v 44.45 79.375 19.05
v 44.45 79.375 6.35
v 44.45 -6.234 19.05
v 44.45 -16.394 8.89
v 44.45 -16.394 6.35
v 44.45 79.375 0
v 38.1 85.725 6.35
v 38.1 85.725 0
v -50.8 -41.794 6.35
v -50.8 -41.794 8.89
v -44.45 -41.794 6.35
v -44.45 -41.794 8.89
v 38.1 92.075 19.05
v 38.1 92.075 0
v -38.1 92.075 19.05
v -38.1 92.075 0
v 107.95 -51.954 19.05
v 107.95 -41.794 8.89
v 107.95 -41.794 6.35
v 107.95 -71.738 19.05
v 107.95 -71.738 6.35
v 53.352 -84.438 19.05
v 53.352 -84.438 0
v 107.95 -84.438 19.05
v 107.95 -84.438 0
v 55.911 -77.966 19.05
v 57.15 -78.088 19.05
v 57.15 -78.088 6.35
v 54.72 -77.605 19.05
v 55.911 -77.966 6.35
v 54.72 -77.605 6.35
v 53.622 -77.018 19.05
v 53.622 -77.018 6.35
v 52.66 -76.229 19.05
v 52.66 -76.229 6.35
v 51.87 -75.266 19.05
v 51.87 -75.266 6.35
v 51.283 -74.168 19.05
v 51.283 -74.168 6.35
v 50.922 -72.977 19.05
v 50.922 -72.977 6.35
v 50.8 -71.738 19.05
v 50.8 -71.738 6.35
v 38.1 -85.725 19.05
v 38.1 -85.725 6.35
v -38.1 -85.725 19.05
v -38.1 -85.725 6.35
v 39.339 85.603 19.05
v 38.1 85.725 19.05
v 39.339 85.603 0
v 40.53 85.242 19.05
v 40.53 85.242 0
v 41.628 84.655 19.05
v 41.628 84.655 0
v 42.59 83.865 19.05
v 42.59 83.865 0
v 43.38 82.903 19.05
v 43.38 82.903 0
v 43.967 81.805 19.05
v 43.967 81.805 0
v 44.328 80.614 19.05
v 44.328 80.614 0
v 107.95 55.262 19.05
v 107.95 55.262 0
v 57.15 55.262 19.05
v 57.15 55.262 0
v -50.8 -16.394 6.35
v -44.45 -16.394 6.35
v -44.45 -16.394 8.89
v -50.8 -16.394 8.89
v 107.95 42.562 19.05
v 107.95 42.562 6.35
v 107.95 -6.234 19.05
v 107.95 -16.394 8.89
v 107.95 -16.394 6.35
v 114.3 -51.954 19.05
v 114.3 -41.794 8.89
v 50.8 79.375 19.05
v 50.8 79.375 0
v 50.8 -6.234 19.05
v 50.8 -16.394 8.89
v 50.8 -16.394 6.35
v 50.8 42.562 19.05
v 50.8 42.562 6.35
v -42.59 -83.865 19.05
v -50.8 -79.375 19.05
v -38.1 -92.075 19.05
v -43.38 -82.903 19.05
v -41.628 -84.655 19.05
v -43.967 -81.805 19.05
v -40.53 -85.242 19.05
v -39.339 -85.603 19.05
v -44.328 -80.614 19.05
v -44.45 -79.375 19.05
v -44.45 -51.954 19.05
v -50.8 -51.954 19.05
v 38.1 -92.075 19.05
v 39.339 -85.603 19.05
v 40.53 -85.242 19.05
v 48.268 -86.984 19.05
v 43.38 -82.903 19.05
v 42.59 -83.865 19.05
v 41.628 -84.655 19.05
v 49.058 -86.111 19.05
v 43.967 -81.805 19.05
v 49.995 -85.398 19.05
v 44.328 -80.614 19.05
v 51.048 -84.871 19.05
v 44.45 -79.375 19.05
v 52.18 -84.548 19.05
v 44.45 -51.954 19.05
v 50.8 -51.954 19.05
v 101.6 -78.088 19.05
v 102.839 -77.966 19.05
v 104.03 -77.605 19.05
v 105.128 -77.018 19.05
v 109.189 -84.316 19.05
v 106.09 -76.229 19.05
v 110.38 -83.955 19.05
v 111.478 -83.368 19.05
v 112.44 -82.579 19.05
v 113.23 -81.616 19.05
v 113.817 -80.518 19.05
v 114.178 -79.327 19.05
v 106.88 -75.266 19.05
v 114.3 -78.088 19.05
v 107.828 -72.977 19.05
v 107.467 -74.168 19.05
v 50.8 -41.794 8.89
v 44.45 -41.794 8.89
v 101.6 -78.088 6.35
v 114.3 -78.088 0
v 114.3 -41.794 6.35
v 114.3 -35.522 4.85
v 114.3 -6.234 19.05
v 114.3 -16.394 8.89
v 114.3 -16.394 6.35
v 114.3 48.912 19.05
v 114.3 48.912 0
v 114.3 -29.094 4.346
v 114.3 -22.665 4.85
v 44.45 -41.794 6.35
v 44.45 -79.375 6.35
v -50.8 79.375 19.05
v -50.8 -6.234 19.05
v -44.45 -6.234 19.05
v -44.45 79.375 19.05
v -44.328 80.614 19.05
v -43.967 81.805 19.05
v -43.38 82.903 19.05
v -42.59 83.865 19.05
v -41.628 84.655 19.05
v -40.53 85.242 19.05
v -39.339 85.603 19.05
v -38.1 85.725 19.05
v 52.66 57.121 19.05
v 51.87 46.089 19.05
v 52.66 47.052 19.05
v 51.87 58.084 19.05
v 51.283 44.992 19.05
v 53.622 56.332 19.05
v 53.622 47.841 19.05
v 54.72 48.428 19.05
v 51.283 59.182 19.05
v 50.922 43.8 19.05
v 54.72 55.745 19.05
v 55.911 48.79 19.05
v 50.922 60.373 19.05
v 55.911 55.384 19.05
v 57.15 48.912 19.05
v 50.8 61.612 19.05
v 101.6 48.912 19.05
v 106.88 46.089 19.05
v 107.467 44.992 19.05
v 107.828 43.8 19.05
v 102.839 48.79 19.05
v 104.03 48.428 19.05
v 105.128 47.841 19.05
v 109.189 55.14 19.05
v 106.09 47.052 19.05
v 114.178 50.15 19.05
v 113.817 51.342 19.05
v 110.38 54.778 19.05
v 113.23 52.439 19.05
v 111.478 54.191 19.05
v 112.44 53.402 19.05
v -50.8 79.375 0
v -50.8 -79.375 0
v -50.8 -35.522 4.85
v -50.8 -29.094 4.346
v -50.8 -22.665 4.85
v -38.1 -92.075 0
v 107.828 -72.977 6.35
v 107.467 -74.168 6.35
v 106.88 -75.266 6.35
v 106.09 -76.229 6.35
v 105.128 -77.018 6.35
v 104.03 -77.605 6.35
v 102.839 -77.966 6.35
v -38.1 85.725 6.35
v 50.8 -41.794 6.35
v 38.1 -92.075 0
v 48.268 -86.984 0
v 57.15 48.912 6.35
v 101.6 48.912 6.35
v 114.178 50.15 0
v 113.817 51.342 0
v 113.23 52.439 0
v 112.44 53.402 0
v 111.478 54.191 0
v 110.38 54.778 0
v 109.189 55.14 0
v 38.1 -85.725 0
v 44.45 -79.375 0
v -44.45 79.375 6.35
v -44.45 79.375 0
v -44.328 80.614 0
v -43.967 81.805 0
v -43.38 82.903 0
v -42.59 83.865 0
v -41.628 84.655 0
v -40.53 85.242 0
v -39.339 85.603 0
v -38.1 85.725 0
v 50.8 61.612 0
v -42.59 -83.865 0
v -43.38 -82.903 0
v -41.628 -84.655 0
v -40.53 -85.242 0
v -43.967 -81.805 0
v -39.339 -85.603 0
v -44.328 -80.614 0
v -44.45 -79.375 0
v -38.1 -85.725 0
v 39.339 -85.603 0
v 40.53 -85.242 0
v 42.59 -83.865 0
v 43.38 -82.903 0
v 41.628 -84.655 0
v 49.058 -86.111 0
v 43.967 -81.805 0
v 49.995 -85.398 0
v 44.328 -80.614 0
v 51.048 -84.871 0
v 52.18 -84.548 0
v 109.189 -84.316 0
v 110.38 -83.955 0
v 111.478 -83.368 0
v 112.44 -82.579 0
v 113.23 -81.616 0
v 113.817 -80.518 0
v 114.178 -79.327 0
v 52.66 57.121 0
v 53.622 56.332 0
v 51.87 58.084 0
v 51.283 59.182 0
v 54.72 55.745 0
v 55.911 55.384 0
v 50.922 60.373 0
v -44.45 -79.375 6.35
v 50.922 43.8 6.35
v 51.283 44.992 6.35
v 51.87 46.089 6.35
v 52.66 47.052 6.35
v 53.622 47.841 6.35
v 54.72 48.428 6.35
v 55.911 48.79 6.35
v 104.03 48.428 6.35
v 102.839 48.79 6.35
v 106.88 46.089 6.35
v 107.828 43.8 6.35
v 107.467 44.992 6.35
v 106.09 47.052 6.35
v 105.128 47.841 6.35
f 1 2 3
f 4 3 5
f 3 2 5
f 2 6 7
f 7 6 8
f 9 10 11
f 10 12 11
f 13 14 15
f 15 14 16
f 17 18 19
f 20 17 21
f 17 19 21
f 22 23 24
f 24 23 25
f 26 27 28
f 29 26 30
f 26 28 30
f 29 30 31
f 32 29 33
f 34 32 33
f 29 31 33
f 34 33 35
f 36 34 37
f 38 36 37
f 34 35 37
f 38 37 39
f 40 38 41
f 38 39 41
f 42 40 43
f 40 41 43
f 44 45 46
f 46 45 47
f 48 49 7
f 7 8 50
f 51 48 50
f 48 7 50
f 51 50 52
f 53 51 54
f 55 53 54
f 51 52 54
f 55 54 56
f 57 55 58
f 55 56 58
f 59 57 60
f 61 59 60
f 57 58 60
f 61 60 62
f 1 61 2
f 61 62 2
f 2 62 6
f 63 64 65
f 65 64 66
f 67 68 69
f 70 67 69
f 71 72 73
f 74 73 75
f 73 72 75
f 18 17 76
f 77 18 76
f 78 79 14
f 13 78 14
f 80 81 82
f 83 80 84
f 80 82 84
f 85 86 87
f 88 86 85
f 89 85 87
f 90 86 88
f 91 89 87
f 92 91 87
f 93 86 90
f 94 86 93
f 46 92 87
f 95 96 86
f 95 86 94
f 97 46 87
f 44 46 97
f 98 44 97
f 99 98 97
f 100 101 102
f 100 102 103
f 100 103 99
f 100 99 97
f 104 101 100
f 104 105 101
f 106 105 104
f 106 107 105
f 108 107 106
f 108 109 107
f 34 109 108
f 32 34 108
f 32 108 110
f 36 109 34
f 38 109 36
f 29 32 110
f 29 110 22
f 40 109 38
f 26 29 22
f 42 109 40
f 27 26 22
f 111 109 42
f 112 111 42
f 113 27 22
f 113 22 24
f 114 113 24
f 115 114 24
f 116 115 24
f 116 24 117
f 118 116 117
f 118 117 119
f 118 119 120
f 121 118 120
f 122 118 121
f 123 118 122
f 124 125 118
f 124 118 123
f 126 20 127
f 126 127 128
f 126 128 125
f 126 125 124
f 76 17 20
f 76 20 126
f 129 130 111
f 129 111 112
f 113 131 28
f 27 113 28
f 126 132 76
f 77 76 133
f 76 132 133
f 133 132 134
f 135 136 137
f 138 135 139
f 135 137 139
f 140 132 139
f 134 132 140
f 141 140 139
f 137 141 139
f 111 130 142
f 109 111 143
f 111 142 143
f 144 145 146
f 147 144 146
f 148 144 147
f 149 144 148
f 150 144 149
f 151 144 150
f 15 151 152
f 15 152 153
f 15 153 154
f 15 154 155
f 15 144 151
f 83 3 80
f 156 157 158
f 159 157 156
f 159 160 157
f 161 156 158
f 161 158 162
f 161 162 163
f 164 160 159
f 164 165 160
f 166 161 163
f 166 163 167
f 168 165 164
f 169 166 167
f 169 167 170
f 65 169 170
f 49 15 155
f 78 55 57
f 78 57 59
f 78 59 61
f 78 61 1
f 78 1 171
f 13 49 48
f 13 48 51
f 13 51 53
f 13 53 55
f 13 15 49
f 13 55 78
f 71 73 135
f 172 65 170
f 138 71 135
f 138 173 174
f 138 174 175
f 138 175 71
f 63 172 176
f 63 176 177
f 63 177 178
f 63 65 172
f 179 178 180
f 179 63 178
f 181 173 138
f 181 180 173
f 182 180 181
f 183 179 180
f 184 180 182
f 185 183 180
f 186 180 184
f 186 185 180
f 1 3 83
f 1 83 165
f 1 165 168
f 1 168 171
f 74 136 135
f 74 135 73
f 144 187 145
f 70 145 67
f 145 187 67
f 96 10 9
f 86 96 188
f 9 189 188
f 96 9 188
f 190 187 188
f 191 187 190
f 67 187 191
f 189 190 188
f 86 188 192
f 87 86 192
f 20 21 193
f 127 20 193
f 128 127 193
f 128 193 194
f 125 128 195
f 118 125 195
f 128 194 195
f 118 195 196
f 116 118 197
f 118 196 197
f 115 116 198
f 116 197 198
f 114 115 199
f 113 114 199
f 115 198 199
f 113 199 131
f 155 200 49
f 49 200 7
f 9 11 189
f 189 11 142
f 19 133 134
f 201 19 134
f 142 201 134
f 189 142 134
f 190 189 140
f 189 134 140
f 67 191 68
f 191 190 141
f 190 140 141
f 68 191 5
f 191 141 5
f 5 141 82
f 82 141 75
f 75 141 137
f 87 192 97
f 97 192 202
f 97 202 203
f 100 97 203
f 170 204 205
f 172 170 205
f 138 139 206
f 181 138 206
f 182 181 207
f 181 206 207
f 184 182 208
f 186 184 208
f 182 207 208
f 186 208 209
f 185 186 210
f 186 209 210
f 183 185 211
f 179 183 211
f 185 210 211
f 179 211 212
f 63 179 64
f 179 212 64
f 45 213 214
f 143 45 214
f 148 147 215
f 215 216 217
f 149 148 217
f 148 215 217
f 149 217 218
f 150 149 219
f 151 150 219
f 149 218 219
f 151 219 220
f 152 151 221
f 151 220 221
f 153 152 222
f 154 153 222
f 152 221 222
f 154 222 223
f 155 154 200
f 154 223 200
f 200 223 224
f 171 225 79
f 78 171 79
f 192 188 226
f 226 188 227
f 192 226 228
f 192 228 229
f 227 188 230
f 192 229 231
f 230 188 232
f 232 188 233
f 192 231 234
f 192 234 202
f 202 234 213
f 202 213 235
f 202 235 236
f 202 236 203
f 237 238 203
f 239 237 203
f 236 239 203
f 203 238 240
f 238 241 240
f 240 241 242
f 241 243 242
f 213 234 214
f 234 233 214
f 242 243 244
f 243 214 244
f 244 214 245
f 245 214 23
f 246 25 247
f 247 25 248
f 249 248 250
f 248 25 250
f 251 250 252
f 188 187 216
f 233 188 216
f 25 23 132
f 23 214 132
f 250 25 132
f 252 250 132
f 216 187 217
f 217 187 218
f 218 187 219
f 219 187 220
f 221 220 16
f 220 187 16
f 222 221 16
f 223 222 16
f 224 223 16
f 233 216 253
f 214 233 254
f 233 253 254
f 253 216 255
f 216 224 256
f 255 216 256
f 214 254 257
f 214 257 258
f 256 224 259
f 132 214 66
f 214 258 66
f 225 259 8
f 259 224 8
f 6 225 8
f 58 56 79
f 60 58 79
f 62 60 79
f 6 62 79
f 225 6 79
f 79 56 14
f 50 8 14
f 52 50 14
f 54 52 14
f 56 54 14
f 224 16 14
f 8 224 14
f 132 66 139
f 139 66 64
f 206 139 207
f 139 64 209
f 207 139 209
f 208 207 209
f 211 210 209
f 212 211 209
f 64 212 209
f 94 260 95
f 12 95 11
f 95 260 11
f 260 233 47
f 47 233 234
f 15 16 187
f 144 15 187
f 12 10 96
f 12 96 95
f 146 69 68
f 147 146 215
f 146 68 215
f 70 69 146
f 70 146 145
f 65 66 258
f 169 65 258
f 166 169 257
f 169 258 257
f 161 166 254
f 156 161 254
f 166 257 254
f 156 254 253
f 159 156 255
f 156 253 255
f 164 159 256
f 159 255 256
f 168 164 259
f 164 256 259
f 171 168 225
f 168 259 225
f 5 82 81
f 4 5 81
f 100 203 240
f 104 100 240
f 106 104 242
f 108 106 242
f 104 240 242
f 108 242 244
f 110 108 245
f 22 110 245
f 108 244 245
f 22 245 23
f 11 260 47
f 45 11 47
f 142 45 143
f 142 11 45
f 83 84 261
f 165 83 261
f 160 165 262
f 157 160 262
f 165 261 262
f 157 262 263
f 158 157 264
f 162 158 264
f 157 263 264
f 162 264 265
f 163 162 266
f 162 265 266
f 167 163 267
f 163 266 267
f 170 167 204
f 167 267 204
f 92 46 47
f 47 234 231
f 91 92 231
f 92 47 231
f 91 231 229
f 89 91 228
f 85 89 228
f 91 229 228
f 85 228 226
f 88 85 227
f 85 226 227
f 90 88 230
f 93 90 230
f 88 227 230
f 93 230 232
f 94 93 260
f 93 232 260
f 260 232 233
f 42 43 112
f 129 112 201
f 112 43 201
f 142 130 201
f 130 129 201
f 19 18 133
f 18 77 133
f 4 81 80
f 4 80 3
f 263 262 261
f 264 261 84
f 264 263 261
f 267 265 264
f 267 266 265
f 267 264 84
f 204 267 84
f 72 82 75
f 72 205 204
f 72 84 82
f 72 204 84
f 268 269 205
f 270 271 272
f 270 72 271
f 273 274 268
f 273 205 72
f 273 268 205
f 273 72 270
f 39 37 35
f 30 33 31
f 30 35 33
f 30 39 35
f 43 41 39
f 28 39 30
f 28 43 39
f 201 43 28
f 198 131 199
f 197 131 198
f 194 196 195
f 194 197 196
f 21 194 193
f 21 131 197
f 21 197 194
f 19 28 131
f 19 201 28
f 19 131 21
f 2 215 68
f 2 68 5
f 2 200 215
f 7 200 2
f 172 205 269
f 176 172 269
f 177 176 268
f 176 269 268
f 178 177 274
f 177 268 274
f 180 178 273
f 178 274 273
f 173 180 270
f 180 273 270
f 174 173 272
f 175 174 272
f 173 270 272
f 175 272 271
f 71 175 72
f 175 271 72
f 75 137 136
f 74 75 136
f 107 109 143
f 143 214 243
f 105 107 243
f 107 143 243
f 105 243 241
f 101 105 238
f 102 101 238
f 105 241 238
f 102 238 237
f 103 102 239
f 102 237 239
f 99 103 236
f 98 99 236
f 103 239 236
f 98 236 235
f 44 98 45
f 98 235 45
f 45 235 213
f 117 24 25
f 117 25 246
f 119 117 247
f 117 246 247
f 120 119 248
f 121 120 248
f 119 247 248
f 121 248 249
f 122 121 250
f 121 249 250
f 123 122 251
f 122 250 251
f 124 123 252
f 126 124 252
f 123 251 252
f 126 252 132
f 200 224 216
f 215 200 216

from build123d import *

# Parameters (mm, degrees)
F1_DEPTH = 6.35
F2_DEPTH = 19.05
F4_DEPTH = 127
F5_SIZE  = 10.16


with BuildPart() as f1:
    # F0 (on Top) → F1 (new body)
    with BuildSketch(Plane.XY):
        with BuildLine():
            Line((50.8, 61.6115713388), (50.8, 79.375))
            Line((50.8, 79.375), (38.1, 92.075))
            Line((38.1, 92.075), (-38.1, 92.075))
            Line((-38.1, 92.075), (-50.8, 79.375))
            Line((-50.8, 79.375), (-50.8, -79.375))
            Line((-50.8, -79.375), (-38.1, -92.075))
            Line((-38.1, -92.075), (38.1, -92.075))
            Line((38.1, -92.075), (48.2682762921, -86.9839524408))
            ThreePointArc((48.2682762921, -86.9839524408), (50.5095218971, -85.1103601516), (53.3524144382, -84.4384286612))
            Line((53.3524144382, -84.4384286612), (107.95, -84.4384286612))
            ThreePointArc((107.95, -84.4384286612), (112.4401280605, -82.5785567218), (114.3, -78.0884286612))
            Line((114.3, -78.0884286612), (114.3, 48.9115713388))
            ThreePointArc((114.3, 48.9115713388), (112.4401280605, 53.4016993993), (107.95, 55.2615713388))
            Line((107.95, 55.2615713388), (57.15, 55.2615713388))
            ThreePointArc((57.15, 55.2615713388), (52.6598719395, 57.1214432782), (50.8, 61.6115713388))
        make_face()
        with BuildLine():
            ThreePointArc((-44.45, 79.375), (-42.5901280605, 83.8651280605), (-38.1, 85.725))
            Line((-38.1, 85.725), (38.1, 85.725))
            ThreePointArc((38.1, 85.725), (42.5901280605, 83.8651280605), (44.45, 79.375))
            Line((44.45, 79.375), (44.45, -79.375))
            ThreePointArc((44.45, -79.375), (42.5901280605, -83.8651280605), (38.1, -85.725))
            Line((38.1, -85.725), (-38.1, -85.725))
            ThreePointArc((-38.1, -85.725), (-42.5901280605, -83.8651280605), (-44.45, -79.375))
            Line((-44.45, -79.375), (-44.45, 79.375))
        make_face(mode=Mode.SUBTRACT)
        with BuildLine():
            Line((101.6, -78.0884286612), (57.15, -78.0884286612))
            ThreePointArc((57.15, -78.0884286612), (52.6598719395, -76.2285567218), (50.8, -71.7384286612))
            Line((50.8, -71.7384286612), (50.8, 42.5615713388))
            ThreePointArc((50.8, 42.5615713388), (52.6598719395, 47.0516993993), (57.15, 48.9115713388))
            Line((57.15, 48.9115713388), (101.6, 48.9115713388))
            ThreePointArc((101.6, 48.9115713388), (106.0901280605, 47.0516993993), (107.95, 42.5615713388))
            Line((107.95, 42.5615713388), (107.95, -71.7384286612))
            ThreePointArc((107.95, -71.7384286612), (106.0901280605, -76.2285567218), (101.6, -78.0884286612))
        make_face(mode=Mode.SUBTRACT)
        Polygon((38.1, 85.725), (-38.1, 85.725), (-44.45, 79.375), (-44.45, -79.375), (-38.1, -85.725), (38.1, -85.725), (44.45, -79.375), (44.45, 79.375), align=None)
        with BuildLine():
            ThreePointArc((50.8, -71.7384286612), (52.6598719395, -76.2285567218), (57.15, -78.0884286612))
            Line((57.15, -78.0884286612), (101.6, -78.0884286612))
            ThreePointArc((101.6, -78.0884286612), (106.0901280605, -76.2285567218), (107.95, -71.7384286612))
            Line((107.95, -71.7384286612), (107.95, 42.5615713388))
            ThreePointArc((107.95, 42.5615713388), (106.0901280605, 47.0516993993), (101.6, 48.9115713388))
            Line((101.6, 48.9115713388), (57.15, 48.9115713388))
            ThreePointArc((57.15, 48.9115713388), (52.6598719395, 47.0516993993), (50.8, 42.5615713388))
            Line((50.8, 42.5615713388), (50.8, -71.7384286612))
        make_face()
    extrude(amount=F1_DEPTH)

    # F0 (on Top) → F2 (join)
    with BuildSketch(Plane.XY):
        with BuildLine():
            Line((50.8, 61.6115713388), (50.8, 79.375))
            Line((50.8, 79.375), (38.1, 92.075))
            Line((38.1, 92.075), (-38.1, 92.075))
            Line((-38.1, 92.075), (-50.8, 79.375))
            Line((-50.8, 79.375), (-50.8, -79.375))
            Line((-50.8, -79.375), (-38.1, -92.075))
            Line((-38.1, -92.075), (38.1, -92.075))
            Line((38.1, -92.075), (48.2682762921, -86.9839524408))
            ThreePointArc((48.2682762921, -86.9839524408), (50.5095218971, -85.1103601516), (53.3524144382, -84.4384286612))
            Line((53.3524144382, -84.4384286612), (107.95, -84.4384286612))
            ThreePointArc((107.95, -84.4384286612), (112.4401280605, -82.5785567218), (114.3, -78.0884286612))
            Line((114.3, -78.0884286612), (114.3, 48.9115713388))
            ThreePointArc((114.3, 48.9115713388), (112.4401280605, 53.4016993993), (107.95, 55.2615713388))
            Line((107.95, 55.2615713388), (57.15, 55.2615713388))
            ThreePointArc((57.15, 55.2615713388), (52.6598719395, 57.1214432782), (50.8, 61.6115713388))
        make_face()
        with BuildLine():
            ThreePointArc((-44.45, 79.375), (-42.5901280605, 83.8651280605), (-38.1, 85.725))
            Line((-38.1, 85.725), (38.1, 85.725))
            ThreePointArc((38.1, 85.725), (42.5901280605, 83.8651280605), (44.45, 79.375))
            Line((44.45, 79.375), (44.45, -79.375))
            ThreePointArc((44.45, -79.375), (42.5901280605, -83.8651280605), (38.1, -85.725))
            Line((38.1, -85.725), (-38.1, -85.725))
            ThreePointArc((-38.1, -85.725), (-42.5901280605, -83.8651280605), (-44.45, -79.375))
            Line((-44.45, -79.375), (-44.45, 79.375))
        make_face(mode=Mode.SUBTRACT)
        with BuildLine():
            Line((101.6, -78.0884286612), (57.15, -78.0884286612))
            ThreePointArc((57.15, -78.0884286612), (52.6598719395, -76.2285567218), (50.8, -71.7384286612))
            Line((50.8, -71.7384286612), (50.8, 42.5615713388))
            ThreePointArc((50.8, 42.5615713388), (52.6598719395, 47.0516993993), (57.15, 48.9115713388))
            Line((57.15, 48.9115713388), (101.6, 48.9115713388))
            ThreePointArc((101.6, 48.9115713388), (106.0901280605, 47.0516993993), (107.95, 42.5615713388))
            Line((107.95, 42.5615713388), (107.95, -71.7384286612))
            ThreePointArc((107.95, -71.7384286612), (106.0901280605, -76.2285567218), (101.6, -78.0884286612))
        make_face(mode=Mode.SUBTRACT)
    extrude(amount=F2_DEPTH)

    # F3 (on Right) → F4 (cut, symmetric)
    with BuildSketch(Plane.YZ):
        with BuildLine():
            ThreePointArc((-41.7938075632, 6.35), (-29.0938075632, 4.3464379948), (-16.3938075632, 6.35))
            Line((-16.3938075632, 6.35), (-16.3938075632, 53.7061375175))
            Line((-16.3938075632, 53.7061375175), (-41.7938075632, 53.7061375175))
            Line((-41.7938075632, 53.7061375175), (-41.7938075632, 6.35))
        make_face()
    extrude(amount=F4_DEPTH, both=True, mode=Mode.SUBTRACT)

    # F5
    f5_edges = [f1.edges().sort_by_distance(p)[0] for p in [
        (111.125, -16.393808, 19.05),
        (47.625, -16.393808, 19.05),
        (-47.625, -16.393808, 19.05),
        (-47.625, -41.793808, 19.05),
        (47.625, -41.793808, 19.05),
        (111.125, -41.793808, 19.05),
    ]]
    chamfer(f5_edges, length=F5_SIZE)


solid = f1.part
